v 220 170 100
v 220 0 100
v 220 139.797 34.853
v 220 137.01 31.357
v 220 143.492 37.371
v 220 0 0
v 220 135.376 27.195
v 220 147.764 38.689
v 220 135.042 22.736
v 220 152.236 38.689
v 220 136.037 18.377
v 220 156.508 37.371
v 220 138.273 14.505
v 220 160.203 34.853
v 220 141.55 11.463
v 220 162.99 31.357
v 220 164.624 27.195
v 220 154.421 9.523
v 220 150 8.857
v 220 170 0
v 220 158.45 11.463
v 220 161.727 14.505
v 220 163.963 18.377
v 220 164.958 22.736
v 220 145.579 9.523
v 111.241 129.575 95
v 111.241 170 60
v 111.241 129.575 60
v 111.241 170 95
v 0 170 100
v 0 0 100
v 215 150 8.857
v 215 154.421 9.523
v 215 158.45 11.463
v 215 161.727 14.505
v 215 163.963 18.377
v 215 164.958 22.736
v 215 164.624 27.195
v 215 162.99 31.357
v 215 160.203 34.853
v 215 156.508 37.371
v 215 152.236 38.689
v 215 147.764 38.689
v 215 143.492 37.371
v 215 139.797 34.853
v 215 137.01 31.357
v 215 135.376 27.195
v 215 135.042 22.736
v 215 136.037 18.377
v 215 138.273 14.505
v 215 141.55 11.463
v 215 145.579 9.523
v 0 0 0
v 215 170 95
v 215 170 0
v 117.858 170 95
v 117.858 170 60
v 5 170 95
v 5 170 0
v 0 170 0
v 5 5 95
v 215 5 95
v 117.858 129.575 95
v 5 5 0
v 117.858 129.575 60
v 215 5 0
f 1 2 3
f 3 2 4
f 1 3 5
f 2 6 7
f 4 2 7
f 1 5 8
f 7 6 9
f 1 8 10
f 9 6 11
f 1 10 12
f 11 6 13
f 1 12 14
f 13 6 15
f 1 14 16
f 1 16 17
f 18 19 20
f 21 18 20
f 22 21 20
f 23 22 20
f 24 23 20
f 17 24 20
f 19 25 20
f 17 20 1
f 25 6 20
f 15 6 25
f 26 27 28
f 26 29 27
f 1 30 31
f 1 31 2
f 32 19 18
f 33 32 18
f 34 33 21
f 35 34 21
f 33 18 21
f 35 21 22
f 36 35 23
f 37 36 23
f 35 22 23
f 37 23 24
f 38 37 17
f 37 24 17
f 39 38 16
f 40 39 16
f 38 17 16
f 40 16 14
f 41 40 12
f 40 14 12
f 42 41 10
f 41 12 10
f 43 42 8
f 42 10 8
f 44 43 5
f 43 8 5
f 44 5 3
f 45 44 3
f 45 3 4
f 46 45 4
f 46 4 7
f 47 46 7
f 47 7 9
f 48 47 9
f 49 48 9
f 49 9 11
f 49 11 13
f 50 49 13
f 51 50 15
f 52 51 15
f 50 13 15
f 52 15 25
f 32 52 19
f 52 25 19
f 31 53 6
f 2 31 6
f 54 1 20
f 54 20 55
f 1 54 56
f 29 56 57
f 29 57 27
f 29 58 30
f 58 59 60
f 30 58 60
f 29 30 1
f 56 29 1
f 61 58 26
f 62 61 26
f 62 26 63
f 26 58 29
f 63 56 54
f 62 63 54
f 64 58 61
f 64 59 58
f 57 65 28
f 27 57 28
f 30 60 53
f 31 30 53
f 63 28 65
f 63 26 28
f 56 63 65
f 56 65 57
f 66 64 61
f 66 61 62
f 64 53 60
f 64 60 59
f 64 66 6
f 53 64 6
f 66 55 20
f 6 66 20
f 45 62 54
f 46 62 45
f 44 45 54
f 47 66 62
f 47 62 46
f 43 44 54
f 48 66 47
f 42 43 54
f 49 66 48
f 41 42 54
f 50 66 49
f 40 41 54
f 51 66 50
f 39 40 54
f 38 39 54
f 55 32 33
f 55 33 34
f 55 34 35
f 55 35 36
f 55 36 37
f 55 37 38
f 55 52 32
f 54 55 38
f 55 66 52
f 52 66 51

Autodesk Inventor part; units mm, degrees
ref_plane "YZ Plane" through (0, 0, 0) normal (1, 0, 0) x (0, 1, 0)
ref_plane "XZ Plane" through (0, 0, 0) normal (0, 1, 0) x (-1, 0, 0)
ref_plane "XY Plane" through (0, 0, 0) normal (0, 0, 1) x (1, 0, 0)
sketch "Sketch1" plane through (0, 0, 0) normal (0, 0, 1) x (1, 0, 0)
  line L0 (0, 0) -> (220, 0)
  line L1 (220, 0) -> (220, 170)
  line L2 (220, 170) -> (0, 170)
  line L3 (0, 170) -> (0, 0)
  dimension "d0" = 220
  dimension "d1" = 170
extrude "Extrusion1" add sketch "Sketch1" along normal blind 100
sketch "Sketch2" plane through (0, 0, 0) normal (0, 0, 1) x (1, 0, 0)
  line L0 (5, 5) -> (215, 5)
  line L1 (215, 5) -> (215, 245)
  line L2 (215, 245) -> (5, 245)
  line L3 (5, 245) -> (5, 5)
  point P0 (0, 0)
  dimension "d4" = 210
  dimension "d5" = 240
  dimension "d8" = 5
  dimension "d13" = 5
extrude "Extrusion2" cut sketch "Sketch2" along normal blind 95
sketch "Sketch3" plane through (220, 0, 0) normal (1, 0, 0) x (0, 0, -1)
  circle A0 centre (-23.8569, 150) radius 15
  line L0 (0, 170) -> (-100, 170) projected
  point P0 (0, 0)
  dimension "d9" = 30
  dimension "d10" = 20
extrude "Extrusion3" cut sketch "Sketch3" against normal blind 45
sketch "Sketch4" plane through (0, 0, 0) normal (-1, 0, 0) x (0, 0, 1)
  circle A0 centre (73.7116, 232.2043) radius 14.7089
  point P0 (0, 0)
extrude "Extrusion4" [suppressed]
sketch "Sketch5" plane through (0, 0, 95) normal (0, 0, -1) x (-1, 0, 0)
  line L0 (-215, 170) -> (-5, 170) projected
  line L1 (-117.8578, 170) -> (-111.2412, 170)
  line L2 (-111.2412, 170) -> (-111.2412, 129.5746)
  line L3 (-111.2412, 129.5746) -> (-117.8578, 129.5746)
  line L4 (-117.8578, 129.5746) -> (-117.8578, 170)
  point P0 (0, 0)
extrude "Extrusion5" add sketch "Sketch5" along normal blind 35
properties part number "corpo"
